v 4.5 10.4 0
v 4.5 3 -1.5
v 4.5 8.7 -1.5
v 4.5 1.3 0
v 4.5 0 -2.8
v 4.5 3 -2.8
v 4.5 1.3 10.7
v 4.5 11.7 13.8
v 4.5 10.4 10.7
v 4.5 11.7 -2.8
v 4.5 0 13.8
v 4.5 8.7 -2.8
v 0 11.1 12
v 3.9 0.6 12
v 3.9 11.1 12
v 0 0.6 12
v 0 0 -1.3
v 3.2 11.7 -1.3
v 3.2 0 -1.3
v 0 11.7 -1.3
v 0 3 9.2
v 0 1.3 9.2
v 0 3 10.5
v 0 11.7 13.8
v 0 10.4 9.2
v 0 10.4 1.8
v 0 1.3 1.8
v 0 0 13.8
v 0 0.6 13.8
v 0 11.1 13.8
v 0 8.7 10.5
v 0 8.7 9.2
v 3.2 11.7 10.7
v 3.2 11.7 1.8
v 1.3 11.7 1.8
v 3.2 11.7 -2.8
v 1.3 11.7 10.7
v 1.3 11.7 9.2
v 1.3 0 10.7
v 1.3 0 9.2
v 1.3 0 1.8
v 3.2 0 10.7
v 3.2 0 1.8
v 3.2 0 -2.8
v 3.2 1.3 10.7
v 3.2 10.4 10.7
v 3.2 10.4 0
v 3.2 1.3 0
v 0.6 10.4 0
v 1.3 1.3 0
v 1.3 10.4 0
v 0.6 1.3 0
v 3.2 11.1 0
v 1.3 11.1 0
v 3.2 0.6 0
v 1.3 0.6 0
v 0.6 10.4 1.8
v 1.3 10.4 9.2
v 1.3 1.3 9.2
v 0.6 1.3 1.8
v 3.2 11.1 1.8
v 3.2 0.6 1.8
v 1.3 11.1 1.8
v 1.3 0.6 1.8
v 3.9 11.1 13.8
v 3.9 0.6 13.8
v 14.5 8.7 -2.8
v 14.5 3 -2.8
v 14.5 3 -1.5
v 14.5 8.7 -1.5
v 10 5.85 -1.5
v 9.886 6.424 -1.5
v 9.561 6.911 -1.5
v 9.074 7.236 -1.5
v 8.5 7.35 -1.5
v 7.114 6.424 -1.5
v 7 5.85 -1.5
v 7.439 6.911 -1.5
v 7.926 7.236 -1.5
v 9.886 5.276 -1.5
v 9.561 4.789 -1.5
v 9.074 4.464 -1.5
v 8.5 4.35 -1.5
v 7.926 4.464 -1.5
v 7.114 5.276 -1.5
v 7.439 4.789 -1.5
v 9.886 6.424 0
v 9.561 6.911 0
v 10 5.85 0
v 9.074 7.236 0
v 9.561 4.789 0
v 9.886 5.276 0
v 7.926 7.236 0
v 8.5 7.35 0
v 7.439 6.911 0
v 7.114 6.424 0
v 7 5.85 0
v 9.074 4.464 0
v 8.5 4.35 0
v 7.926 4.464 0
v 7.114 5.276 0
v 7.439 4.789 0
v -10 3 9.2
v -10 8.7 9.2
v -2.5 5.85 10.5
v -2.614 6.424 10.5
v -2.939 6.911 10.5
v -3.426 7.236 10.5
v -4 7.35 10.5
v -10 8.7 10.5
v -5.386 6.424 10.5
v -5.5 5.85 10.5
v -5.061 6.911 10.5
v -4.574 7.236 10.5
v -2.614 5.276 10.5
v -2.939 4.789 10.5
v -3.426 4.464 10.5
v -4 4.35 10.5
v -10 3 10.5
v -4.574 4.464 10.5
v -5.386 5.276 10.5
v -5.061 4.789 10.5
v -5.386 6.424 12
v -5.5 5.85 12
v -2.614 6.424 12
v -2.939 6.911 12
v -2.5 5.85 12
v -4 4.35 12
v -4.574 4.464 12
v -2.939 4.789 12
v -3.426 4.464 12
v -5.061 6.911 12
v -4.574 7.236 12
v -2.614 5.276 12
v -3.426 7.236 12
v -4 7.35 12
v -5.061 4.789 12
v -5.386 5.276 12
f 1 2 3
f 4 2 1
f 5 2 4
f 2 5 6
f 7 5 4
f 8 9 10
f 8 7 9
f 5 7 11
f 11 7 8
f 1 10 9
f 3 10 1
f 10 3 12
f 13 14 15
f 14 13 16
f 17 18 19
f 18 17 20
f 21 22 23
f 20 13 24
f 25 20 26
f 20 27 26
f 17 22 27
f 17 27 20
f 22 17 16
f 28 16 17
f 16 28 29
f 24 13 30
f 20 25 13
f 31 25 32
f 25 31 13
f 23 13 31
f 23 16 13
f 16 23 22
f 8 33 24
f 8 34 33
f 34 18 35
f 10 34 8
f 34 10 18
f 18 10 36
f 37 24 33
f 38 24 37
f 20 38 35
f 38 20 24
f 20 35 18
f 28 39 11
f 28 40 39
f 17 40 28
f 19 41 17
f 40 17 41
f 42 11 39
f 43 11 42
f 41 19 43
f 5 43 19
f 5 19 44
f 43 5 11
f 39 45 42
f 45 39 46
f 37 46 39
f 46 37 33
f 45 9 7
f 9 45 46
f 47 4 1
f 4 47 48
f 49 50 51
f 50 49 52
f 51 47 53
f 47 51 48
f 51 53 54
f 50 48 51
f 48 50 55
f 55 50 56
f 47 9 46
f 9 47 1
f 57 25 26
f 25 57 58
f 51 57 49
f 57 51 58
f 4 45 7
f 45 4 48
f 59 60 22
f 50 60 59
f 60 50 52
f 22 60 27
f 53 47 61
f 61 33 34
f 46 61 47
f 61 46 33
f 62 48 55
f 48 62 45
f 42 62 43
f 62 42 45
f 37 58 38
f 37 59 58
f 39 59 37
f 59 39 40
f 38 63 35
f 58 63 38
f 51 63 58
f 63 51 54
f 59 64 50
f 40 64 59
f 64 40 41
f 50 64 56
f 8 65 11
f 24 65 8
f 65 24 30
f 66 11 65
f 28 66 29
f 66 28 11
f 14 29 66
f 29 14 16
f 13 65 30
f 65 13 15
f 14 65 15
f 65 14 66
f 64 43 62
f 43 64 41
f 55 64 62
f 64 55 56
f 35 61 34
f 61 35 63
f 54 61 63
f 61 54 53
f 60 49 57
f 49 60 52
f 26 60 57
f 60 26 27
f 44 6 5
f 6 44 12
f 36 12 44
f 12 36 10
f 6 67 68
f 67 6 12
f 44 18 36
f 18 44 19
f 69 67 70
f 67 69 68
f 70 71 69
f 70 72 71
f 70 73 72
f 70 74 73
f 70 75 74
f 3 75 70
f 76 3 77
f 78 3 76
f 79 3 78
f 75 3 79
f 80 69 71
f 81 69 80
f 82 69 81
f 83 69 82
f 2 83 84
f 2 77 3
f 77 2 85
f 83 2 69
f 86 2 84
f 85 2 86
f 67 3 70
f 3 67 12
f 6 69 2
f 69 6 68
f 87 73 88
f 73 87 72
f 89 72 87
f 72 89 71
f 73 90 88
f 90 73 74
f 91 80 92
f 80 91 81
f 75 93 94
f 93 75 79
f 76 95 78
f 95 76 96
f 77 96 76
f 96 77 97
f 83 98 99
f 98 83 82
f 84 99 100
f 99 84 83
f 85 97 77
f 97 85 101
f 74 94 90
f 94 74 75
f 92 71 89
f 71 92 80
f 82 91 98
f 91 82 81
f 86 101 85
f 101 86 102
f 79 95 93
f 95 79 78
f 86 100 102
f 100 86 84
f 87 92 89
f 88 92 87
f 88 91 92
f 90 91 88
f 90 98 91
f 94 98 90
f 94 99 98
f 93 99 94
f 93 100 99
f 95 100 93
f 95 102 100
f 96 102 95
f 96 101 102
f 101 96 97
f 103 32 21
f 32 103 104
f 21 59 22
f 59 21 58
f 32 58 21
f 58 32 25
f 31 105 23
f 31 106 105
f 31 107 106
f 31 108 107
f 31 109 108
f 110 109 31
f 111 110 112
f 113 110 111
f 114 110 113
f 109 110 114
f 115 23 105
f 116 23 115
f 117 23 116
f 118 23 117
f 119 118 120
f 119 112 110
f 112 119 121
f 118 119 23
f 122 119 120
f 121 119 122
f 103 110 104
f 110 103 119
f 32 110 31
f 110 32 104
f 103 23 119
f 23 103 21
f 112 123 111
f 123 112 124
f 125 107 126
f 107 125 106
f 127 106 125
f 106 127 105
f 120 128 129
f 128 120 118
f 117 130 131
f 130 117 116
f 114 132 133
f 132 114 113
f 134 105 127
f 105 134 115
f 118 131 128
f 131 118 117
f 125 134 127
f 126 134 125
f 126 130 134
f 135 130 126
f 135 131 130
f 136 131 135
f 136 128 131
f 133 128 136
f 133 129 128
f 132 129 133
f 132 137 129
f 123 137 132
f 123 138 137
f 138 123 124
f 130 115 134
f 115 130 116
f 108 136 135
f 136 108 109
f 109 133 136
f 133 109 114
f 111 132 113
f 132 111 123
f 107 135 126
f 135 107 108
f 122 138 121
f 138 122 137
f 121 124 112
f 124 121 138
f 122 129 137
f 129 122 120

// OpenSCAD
WS = 0.3;   // pixel to mm
TH = 1.3 / WS;   // minimum thickness
TH2 = 0.6 / WS;

l1 = 102.47;
l2 = 142.47;
h = abs(l2 - l1);
w = 39;
d = 15;
cw = max(w - 6 / WS, 4 / WS);
cl = 10 / WS;
// echo("Connector length: " + (cl * WS) + "mm");

scale([WS, WS, WS]) {
  // floor & pillars
  difference() {
    translate([0, 0, -TH]) cube([d, w, h + TH]);
    translate([-5, TH, 0]) cube([d + 10, w - TH * 2, h - TH]);
    translate([TH, -5, 0]) cube([d - TH * 2, w + 10, h - TH]);
  }

  // lower box
  cube([d, TH2, 6]);
  translate([0, w - TH2, 0]) cube([d, TH2, 6]);
  cube([TH2, w, 6]);

  // lower connector
  translate([d - TH, 0, -(TH+1.5/WS)]) cube([TH, w, TH+1.5/WS]);
  translate([d, (w - cw) / 2, -(TH+1.5/WS)]) cube([cl, cw, TH]);
  translate([d+4/WS, w/2, -1.7/WS]) cylinder(r=1.5/WS, h=1.7/WS);

  // upper box
  translate([0, 0, h]) {
    cube([d, TH2, 6]);
    translate([0, w - TH2, 0]) cube([d, TH2, 6]);
    translate([d - TH2, 0, 0]) cube([TH2, w, 6]);
  }

  // upper connector
  translate([0, 0, h - (TH+1.5/WS)]) cube([TH, w, TH+1.5/WS]);
  translate([-cl, (w - cw) / 2, h - (TH+1.5/WS)]) cube([cl, cw, TH]);
  translate([-4/WS, w/2, h-1.7/WS]) cylinder(r=1.5/WS, h=1.7/WS);
}
